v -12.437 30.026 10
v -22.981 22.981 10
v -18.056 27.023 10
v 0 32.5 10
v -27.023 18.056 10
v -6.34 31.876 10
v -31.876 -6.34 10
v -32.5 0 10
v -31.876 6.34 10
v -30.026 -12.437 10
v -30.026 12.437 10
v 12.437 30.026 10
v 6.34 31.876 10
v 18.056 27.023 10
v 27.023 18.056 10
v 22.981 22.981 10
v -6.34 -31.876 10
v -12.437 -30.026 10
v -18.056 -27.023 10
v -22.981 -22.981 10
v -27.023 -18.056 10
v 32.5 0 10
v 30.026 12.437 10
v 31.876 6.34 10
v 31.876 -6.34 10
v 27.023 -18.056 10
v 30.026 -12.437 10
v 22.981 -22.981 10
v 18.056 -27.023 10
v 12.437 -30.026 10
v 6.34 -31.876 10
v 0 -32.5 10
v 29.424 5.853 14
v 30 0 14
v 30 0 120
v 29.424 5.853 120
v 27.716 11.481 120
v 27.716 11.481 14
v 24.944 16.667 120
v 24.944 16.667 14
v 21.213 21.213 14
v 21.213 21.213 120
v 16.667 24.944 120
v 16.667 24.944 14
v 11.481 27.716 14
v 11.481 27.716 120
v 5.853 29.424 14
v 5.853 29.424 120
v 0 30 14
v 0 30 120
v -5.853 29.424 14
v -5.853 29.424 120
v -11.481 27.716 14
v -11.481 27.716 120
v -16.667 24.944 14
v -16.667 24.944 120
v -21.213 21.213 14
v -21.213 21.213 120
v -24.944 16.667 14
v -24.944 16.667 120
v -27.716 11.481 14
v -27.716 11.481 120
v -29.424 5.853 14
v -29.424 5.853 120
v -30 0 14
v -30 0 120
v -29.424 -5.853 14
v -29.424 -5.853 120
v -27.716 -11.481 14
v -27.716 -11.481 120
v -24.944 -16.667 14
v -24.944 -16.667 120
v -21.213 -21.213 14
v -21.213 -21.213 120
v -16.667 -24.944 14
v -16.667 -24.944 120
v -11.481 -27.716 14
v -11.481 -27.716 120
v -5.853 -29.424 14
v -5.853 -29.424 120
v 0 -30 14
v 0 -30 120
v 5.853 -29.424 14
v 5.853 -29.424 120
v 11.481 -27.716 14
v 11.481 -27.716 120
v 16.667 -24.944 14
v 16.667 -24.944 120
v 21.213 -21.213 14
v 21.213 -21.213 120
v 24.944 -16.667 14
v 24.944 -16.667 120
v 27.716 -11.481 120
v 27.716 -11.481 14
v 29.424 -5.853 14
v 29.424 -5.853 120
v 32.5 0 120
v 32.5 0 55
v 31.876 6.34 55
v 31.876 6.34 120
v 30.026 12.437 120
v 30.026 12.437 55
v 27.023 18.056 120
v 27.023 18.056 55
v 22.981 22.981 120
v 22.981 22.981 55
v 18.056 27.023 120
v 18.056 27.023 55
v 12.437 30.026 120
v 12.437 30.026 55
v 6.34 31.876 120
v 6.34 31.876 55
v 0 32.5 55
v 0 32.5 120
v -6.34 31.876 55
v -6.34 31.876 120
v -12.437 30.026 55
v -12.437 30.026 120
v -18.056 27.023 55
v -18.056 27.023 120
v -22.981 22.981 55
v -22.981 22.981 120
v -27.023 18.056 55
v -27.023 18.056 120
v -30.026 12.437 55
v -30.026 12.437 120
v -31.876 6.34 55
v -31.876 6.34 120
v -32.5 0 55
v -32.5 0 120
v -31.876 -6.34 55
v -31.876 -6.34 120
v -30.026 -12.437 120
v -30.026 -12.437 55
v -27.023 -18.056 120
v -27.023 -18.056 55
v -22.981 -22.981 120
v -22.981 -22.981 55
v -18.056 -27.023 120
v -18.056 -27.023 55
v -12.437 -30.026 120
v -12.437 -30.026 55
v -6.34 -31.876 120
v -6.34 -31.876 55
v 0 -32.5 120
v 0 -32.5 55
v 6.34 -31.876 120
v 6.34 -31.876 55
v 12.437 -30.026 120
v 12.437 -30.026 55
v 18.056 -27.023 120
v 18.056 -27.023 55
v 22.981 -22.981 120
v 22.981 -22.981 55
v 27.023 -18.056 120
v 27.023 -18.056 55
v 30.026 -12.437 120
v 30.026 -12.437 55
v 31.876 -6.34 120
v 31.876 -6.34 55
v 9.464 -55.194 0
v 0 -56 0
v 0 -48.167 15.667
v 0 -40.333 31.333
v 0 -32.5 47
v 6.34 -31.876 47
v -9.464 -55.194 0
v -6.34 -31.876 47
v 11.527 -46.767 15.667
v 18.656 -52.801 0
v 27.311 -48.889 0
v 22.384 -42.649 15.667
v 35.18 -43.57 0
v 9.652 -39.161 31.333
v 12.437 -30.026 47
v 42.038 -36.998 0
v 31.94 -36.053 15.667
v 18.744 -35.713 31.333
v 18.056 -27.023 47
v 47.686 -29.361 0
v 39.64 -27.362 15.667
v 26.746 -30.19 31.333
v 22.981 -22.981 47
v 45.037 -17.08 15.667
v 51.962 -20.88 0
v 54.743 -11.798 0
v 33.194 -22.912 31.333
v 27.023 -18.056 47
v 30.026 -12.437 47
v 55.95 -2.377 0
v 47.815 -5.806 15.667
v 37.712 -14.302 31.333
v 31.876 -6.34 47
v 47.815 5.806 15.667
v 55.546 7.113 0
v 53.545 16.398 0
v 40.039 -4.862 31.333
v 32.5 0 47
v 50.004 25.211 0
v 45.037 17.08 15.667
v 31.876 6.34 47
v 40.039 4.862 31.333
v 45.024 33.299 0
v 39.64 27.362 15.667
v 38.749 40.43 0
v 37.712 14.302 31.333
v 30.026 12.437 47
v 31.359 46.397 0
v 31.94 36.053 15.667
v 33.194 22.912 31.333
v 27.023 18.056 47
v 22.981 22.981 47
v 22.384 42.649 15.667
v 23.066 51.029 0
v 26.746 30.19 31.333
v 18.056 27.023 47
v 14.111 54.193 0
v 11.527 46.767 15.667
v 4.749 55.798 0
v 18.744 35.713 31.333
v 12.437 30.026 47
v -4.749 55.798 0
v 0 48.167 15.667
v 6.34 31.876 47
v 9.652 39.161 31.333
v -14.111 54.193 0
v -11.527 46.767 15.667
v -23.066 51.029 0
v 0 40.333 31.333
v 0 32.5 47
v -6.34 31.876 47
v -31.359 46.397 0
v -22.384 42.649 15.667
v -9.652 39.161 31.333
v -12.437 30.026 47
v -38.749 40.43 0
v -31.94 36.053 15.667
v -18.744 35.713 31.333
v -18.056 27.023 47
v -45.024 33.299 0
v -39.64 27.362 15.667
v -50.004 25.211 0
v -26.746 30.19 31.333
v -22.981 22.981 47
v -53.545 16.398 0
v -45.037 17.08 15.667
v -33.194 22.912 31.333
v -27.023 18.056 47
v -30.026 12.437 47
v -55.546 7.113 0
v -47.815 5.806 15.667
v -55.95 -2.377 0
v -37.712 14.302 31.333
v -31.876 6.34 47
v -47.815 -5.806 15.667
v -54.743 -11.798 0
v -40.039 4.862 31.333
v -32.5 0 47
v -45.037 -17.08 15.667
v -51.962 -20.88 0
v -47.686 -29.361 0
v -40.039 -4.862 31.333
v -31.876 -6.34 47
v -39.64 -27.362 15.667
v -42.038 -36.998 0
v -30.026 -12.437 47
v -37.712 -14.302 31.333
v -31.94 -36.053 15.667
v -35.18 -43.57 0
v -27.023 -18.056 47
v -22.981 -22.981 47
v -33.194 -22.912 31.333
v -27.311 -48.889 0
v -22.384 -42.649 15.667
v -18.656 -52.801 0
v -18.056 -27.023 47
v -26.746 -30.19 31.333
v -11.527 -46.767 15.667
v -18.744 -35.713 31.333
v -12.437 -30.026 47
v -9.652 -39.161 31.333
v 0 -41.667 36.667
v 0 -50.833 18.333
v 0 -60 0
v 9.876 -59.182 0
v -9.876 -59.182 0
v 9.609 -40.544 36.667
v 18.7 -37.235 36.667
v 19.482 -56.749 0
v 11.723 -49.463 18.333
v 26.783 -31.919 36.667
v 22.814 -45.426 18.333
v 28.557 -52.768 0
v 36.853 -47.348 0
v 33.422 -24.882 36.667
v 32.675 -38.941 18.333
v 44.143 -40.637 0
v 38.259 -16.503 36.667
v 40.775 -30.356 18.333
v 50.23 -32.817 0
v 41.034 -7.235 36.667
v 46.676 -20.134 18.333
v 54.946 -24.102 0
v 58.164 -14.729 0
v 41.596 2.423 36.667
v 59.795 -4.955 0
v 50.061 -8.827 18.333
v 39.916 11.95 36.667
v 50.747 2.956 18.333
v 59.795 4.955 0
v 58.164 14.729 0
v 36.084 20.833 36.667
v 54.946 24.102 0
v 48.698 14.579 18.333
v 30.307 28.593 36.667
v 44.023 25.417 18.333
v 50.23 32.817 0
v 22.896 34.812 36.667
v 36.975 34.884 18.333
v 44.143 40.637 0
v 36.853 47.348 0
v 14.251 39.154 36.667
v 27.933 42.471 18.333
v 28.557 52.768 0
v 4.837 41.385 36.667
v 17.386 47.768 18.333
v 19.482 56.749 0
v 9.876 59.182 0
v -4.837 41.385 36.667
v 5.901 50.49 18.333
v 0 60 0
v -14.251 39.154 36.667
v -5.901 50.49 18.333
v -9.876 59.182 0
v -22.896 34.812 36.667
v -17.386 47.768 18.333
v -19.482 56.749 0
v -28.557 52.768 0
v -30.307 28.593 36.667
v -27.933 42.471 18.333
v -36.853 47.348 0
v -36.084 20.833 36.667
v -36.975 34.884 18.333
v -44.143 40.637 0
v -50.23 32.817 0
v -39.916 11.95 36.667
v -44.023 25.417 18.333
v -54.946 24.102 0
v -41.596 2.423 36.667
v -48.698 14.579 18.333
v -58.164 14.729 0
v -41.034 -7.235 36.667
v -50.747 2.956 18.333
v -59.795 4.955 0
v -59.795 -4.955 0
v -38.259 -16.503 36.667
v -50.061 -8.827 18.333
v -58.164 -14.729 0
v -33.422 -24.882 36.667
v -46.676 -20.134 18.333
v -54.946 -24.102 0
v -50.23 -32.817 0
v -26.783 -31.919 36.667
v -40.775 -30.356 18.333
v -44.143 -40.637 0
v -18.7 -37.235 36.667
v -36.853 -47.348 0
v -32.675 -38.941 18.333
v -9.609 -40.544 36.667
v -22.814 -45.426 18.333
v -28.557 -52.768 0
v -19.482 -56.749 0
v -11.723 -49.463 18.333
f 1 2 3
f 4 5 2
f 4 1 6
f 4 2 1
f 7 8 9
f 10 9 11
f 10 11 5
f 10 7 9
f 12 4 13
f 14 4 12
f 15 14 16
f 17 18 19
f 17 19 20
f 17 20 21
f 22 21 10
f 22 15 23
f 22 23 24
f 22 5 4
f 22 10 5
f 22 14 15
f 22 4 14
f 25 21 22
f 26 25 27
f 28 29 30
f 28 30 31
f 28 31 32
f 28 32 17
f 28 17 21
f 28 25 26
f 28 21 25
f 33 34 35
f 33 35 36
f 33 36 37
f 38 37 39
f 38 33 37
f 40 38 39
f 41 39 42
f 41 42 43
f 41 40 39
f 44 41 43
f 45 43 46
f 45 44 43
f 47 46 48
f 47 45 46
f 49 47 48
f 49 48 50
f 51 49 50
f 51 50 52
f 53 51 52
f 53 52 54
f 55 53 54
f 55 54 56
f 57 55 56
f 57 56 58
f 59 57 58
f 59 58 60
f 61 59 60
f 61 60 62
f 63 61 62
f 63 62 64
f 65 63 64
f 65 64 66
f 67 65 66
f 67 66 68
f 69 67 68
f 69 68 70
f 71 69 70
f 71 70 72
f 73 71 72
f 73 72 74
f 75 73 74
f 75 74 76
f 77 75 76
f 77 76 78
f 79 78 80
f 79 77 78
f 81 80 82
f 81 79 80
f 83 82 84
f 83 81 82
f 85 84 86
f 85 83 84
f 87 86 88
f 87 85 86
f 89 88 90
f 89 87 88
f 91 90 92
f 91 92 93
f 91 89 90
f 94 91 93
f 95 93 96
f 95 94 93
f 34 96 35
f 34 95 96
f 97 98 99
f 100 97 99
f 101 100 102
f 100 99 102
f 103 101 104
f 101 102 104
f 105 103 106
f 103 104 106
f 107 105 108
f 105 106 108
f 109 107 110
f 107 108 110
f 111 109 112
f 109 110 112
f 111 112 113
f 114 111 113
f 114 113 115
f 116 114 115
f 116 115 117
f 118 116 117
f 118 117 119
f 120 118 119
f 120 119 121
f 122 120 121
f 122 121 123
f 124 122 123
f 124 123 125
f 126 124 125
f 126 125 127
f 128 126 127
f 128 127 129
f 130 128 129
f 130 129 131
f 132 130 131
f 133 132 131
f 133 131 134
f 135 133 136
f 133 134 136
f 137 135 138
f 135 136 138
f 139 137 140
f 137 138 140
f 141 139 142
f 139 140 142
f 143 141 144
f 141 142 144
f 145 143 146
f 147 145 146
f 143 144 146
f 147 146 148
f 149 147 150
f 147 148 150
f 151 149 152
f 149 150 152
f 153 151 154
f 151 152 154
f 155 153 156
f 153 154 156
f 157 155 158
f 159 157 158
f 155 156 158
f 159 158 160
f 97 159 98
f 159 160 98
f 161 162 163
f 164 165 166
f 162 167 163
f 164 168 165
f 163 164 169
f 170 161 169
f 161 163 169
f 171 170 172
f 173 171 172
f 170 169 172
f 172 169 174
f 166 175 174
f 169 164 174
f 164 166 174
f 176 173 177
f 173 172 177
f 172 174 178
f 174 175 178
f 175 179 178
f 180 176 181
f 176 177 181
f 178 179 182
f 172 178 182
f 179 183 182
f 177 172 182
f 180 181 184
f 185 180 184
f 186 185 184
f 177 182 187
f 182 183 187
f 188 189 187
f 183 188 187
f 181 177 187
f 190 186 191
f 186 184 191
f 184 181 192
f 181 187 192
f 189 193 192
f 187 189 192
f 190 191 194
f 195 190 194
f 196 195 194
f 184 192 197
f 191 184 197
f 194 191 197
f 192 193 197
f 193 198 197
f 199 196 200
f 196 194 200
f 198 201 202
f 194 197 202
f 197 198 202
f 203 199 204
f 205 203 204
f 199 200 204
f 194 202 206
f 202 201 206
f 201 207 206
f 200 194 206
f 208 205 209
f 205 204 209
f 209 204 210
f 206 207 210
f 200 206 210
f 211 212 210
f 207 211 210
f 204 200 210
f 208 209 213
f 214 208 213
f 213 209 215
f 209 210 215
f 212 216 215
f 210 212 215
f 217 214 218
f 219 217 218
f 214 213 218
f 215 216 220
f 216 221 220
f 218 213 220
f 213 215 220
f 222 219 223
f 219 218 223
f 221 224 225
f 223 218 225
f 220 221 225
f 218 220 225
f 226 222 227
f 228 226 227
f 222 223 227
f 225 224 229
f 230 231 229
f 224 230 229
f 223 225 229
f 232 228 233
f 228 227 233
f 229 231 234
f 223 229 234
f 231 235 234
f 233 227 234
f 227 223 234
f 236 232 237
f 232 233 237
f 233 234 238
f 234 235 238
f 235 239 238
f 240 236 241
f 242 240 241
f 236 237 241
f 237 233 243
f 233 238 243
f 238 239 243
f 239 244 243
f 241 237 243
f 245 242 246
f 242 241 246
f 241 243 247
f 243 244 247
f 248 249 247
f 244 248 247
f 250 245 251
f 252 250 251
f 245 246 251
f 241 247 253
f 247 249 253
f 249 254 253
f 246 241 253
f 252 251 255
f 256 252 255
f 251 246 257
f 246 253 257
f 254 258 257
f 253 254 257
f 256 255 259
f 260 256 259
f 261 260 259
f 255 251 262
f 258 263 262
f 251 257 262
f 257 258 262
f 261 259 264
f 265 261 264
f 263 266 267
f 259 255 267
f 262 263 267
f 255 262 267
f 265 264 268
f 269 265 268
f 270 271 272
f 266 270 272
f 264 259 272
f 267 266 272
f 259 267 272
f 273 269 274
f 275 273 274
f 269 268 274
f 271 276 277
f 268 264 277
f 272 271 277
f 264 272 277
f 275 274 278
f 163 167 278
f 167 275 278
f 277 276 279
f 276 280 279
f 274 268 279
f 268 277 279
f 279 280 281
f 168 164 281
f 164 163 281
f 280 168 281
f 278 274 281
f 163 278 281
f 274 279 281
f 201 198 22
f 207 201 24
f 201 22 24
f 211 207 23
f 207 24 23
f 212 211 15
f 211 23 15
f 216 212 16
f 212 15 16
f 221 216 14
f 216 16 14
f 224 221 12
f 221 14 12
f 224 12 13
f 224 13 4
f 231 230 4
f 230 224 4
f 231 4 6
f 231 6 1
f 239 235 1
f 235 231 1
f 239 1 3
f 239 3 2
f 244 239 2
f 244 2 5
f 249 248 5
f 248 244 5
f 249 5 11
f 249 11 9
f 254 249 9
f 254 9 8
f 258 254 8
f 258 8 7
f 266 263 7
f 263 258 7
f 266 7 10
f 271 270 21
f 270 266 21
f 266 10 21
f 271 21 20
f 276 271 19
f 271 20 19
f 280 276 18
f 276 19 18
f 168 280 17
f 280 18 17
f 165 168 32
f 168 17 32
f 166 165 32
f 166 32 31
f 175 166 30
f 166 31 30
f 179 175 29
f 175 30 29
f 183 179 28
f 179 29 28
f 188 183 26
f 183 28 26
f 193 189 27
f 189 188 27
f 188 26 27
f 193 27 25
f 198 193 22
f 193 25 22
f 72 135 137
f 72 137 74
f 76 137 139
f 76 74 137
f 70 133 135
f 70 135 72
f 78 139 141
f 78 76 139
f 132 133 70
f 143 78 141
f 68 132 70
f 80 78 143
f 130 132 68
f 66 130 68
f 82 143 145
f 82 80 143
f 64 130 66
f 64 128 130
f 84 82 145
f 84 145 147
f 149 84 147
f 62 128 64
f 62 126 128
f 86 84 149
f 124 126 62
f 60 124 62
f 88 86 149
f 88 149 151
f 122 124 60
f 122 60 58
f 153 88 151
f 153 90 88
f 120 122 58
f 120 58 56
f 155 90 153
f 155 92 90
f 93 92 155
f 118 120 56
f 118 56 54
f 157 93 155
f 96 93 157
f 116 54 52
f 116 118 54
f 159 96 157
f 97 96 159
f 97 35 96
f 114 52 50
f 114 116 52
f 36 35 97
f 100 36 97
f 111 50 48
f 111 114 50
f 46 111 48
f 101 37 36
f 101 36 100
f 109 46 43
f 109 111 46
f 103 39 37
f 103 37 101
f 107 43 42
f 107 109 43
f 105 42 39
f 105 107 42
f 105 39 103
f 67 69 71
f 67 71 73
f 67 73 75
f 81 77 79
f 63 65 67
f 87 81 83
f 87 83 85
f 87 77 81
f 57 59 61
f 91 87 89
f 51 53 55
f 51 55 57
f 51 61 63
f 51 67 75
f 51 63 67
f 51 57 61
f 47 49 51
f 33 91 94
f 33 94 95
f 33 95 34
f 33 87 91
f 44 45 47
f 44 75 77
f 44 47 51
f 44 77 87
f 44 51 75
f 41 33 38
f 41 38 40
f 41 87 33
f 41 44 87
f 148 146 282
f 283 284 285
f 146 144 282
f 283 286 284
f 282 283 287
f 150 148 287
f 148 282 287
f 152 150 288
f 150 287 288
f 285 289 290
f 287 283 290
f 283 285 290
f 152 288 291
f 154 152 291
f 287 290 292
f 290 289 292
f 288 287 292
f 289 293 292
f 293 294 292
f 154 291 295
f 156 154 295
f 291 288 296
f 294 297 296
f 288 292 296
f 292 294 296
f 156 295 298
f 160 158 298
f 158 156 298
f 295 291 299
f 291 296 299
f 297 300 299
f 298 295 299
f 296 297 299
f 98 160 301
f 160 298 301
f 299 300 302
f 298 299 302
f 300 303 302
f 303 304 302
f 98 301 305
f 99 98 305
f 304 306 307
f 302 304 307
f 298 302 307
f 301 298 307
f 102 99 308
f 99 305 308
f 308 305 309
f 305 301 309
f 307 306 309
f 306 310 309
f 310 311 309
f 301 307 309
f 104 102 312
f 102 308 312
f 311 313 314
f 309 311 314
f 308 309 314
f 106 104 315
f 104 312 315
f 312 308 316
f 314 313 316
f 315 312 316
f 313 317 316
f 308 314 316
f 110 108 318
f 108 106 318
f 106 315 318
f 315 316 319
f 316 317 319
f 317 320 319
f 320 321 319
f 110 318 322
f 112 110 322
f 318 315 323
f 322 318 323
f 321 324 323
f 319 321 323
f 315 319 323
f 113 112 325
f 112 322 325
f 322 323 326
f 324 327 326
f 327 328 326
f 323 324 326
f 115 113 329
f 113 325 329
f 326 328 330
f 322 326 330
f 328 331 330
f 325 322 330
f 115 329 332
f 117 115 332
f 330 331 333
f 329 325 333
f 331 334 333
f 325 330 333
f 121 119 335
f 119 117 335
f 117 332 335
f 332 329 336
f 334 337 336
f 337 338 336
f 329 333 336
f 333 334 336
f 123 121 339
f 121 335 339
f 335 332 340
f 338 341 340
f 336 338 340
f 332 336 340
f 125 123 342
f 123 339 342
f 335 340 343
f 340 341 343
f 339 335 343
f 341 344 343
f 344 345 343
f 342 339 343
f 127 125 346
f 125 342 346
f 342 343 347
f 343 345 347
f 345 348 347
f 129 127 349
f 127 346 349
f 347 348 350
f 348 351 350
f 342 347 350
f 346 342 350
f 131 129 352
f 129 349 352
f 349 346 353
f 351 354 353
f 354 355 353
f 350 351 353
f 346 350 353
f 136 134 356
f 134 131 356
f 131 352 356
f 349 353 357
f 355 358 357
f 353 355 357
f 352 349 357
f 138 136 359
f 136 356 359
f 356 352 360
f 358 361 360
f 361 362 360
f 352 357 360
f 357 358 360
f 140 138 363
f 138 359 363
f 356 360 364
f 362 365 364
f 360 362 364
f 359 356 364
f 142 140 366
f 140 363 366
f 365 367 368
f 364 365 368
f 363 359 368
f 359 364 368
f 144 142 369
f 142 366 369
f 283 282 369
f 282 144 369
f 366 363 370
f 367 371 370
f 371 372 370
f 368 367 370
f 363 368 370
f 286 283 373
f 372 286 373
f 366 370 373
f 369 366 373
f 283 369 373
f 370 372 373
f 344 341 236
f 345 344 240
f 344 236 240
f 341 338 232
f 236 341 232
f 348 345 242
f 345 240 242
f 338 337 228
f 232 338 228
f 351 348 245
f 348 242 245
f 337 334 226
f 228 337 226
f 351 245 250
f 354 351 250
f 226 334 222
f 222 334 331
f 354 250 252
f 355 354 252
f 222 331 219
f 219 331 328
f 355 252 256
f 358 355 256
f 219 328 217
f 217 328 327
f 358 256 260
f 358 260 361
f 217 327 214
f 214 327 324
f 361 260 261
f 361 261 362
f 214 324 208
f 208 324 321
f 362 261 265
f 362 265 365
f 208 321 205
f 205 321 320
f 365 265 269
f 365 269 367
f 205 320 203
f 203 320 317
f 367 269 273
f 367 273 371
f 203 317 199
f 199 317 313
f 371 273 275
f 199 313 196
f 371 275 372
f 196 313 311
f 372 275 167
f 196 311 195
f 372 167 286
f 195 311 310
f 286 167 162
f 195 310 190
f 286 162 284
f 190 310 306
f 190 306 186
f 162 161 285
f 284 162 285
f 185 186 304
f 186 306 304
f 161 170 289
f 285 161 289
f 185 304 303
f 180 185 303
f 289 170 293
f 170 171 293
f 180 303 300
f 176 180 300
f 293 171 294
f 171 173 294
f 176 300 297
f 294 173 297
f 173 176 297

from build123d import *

# Parameters (mm, degrees)
F0_R        = 32.5
F0_R_2      = 30
F1_DEPTH    = 120
F1_FACE_R   = 32.5
F1_FACE_R_2 = 30
F4_DEPTH    = 10
F5_DEPTH    = 14
F5_FACE_R   = 30
F6_DEPTH    = 10


with BuildPart() as f1:
    # F0 (on Top) → F1 (new body)
    with BuildSketch(Plane.XY):
        Circle(F0_R)
        Circle(F0_R_2, mode=Mode.SUBTRACT)
    extrude(amount=F1_DEPTH)

    # F2 (on Right) → F3 (revolve)
    with BuildSketch(Plane.YZ):
        Polygon((-56, 0), (-30, 52), (-30, 60), (-60, 0), align=None)
    revolve(axis=Axis((0, 0, 30), (0, 0, 1)))

    # F1_face (on face) → F4 (cut)
    with BuildSketch(Plane(origin=(0, 0, 0), x_dir=(1, 0, 0), z_dir=(0, 0, -1))):
        Circle(F1_FACE_R)
        Circle(F1_FACE_R_2, mode=Mode.SUBTRACT)
    extrude(amount=-F4_DEPTH, mode=Mode.SUBTRACT)

    # F0 (on Top) → F5 (join)
    with BuildSketch(Plane.XY):
        Circle(F0_R_2)
    extrude(amount=F5_DEPTH)

    # F5_face (on face) → F6 (cut)
    with BuildSketch(Plane(origin=(0, 0, 0), x_dir=(1, 0, 0), z_dir=(0, 0, -1))):
        Circle(F5_FACE_R)
    extrude(amount=-F6_DEPTH, mode=Mode.SUBTRACT)


solid = f1.part
